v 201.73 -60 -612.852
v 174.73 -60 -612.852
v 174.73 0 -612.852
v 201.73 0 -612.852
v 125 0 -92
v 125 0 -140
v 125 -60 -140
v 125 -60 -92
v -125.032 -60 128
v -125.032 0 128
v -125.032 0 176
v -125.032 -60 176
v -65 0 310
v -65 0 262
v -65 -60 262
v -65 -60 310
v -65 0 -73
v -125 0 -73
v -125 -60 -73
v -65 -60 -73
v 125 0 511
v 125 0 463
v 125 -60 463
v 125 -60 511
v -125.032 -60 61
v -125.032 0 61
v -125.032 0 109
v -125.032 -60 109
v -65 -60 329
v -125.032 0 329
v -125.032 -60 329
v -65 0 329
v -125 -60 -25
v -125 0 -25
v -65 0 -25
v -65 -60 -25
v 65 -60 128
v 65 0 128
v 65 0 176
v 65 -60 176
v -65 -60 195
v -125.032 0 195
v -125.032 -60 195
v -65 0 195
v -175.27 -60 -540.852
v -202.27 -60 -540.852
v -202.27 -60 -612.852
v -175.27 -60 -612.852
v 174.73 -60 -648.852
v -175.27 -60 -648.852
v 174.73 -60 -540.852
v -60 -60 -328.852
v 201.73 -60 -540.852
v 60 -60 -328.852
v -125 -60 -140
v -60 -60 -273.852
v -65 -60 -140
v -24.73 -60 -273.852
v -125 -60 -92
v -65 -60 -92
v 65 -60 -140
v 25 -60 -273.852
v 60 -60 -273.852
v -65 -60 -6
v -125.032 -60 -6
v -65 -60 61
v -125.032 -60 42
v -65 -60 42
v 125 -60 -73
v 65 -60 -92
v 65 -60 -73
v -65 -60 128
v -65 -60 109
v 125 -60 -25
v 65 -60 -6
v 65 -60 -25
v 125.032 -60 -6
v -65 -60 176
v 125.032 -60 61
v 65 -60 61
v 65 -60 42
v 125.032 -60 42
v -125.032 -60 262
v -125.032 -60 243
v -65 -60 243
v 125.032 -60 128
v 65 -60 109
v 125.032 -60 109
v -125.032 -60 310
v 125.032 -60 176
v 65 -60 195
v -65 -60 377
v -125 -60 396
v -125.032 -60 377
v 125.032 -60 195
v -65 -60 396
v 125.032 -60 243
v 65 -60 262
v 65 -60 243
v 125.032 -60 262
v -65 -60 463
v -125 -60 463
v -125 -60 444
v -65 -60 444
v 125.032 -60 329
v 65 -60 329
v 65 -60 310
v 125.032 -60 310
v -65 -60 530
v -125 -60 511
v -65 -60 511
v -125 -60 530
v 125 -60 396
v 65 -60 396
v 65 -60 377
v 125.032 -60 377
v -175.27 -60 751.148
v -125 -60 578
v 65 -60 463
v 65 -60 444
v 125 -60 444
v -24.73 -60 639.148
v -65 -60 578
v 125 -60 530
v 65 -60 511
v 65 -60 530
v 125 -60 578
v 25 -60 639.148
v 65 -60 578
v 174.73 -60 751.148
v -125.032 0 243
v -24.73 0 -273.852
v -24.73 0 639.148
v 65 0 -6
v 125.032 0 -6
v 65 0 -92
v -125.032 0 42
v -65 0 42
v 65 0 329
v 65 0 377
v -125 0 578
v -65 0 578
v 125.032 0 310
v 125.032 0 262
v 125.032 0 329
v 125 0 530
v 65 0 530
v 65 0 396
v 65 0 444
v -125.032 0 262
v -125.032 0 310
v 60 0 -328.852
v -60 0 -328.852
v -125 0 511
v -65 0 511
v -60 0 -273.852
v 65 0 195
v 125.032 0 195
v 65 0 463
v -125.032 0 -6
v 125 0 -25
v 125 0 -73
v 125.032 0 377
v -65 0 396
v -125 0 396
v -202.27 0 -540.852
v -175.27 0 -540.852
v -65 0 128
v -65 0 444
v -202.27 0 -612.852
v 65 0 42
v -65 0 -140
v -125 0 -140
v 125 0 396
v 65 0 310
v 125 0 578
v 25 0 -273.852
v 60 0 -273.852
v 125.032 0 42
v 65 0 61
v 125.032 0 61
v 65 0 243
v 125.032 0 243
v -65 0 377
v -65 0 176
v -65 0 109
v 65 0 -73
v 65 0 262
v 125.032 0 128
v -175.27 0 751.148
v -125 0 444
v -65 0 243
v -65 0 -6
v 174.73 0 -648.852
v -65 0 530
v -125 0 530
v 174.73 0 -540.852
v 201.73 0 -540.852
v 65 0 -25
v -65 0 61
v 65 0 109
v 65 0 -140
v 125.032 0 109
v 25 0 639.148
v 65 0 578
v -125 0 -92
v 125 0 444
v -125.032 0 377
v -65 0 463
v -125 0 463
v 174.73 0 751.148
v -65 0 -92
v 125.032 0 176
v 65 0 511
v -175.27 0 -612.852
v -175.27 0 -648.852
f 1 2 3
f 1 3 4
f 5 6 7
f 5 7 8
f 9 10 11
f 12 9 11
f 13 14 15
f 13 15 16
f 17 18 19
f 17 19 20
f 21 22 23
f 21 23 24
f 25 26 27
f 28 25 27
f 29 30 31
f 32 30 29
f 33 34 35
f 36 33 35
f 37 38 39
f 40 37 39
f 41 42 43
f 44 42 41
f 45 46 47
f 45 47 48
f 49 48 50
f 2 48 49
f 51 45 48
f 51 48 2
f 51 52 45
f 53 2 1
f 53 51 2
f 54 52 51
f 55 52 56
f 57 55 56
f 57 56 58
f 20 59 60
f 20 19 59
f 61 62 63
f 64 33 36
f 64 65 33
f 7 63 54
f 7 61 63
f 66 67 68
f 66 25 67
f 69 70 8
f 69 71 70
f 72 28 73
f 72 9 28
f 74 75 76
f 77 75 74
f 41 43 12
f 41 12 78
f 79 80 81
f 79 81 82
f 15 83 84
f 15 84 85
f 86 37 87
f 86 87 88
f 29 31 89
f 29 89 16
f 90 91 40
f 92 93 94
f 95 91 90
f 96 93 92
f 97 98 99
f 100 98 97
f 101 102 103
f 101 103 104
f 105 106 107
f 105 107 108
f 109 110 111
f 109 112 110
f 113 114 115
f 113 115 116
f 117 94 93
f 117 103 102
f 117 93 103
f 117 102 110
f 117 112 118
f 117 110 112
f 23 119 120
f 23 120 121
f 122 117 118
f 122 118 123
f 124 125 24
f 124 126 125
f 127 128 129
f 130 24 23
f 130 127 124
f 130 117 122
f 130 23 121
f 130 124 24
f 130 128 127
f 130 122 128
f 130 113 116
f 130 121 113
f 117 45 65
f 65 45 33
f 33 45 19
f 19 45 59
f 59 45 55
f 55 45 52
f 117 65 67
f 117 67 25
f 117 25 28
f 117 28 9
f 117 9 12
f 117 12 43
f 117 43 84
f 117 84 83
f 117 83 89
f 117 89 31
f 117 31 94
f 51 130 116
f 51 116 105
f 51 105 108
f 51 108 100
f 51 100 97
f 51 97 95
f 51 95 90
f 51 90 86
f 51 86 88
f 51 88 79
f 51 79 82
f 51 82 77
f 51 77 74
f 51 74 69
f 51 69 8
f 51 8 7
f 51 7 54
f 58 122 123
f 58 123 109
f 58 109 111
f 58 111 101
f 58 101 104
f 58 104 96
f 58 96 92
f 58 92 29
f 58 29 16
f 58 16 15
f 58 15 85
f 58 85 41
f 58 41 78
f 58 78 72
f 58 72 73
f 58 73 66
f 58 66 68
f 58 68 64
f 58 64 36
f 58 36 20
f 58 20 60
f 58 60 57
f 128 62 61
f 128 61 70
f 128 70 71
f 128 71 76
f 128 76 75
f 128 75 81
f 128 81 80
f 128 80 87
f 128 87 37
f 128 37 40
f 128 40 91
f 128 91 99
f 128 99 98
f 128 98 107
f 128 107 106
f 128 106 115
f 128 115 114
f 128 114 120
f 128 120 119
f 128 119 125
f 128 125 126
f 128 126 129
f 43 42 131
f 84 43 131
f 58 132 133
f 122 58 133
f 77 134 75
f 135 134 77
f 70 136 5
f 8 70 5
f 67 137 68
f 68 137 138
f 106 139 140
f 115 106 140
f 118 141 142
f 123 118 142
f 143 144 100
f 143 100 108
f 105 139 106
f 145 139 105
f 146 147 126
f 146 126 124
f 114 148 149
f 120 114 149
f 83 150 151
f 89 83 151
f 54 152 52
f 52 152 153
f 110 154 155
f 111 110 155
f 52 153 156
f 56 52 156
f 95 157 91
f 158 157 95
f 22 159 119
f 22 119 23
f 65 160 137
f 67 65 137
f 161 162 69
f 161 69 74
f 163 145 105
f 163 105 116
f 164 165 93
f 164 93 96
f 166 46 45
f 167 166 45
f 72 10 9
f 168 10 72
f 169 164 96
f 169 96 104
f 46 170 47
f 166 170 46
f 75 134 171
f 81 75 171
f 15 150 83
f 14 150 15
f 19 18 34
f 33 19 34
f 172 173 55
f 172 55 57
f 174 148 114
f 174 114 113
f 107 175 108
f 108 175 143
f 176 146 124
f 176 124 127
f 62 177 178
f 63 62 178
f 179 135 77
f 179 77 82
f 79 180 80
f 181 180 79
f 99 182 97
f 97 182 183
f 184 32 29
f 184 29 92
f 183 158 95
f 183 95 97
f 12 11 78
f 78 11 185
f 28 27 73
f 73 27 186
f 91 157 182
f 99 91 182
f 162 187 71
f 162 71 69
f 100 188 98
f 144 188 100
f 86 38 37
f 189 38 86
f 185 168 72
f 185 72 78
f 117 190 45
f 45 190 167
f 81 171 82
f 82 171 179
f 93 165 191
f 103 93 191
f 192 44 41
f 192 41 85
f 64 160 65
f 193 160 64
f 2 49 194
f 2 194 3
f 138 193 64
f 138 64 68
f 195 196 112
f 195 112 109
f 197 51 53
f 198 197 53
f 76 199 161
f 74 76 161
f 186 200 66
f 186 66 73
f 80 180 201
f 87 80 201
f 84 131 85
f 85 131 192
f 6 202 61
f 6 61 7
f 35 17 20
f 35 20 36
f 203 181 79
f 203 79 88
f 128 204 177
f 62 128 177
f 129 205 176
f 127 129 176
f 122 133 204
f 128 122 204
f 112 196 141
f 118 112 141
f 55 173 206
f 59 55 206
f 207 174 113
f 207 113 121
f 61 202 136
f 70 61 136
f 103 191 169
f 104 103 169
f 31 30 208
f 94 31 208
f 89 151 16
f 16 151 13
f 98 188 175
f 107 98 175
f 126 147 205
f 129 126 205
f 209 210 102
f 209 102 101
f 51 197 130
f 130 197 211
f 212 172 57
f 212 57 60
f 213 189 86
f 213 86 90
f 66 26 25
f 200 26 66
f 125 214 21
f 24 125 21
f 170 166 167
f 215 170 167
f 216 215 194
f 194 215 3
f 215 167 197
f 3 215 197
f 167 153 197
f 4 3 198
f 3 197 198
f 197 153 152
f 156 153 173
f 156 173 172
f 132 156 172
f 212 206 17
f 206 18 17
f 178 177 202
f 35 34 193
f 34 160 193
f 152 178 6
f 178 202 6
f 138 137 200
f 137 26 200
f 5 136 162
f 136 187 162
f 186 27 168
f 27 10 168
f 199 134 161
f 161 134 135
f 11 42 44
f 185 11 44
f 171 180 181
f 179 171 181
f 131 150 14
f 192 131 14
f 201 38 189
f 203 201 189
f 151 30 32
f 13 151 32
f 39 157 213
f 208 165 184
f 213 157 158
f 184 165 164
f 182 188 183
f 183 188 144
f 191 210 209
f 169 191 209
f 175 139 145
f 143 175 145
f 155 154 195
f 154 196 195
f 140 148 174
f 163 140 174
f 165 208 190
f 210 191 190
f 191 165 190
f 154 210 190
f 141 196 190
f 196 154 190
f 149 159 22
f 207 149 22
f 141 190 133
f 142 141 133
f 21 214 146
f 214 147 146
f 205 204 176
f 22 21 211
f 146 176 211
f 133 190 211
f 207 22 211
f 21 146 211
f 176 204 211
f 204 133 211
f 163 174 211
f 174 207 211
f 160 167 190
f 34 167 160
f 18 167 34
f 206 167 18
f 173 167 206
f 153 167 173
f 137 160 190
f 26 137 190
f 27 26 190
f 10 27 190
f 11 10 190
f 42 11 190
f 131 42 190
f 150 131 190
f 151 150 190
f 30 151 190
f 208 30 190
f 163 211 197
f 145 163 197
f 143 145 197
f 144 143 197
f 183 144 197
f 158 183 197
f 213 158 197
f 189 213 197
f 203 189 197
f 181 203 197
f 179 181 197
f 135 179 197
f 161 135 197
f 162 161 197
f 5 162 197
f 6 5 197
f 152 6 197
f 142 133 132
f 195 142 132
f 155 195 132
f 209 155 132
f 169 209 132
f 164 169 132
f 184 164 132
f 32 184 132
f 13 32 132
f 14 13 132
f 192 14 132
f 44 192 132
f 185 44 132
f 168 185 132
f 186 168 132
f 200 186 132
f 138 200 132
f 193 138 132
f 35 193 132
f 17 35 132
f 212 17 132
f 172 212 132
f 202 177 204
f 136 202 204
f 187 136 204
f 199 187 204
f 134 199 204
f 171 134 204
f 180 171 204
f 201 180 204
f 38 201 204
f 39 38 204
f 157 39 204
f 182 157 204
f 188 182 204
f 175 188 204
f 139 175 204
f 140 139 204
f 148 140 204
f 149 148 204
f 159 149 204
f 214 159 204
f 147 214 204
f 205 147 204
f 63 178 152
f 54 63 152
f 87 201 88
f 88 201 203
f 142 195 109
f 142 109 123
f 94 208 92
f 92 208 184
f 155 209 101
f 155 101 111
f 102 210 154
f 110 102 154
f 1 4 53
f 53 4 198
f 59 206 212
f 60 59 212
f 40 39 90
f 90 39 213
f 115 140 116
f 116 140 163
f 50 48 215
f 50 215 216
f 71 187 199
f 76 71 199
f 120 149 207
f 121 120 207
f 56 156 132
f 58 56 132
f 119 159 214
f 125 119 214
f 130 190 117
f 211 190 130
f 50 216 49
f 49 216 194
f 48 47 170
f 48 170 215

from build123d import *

# Parameters (mm, degrees)
F0_W     = 350
F0_H     = 1250
F0_W_2   = 60
F0_H_2   = 48
F0_W_3   = 60.0317394733
F0_W_4   = 27
F0_H_3   = 72
F1_DEPTH = 60


with BuildPart() as f1:
    # F0 (on Front) → F1 (new body)
    with BuildSketch(Plane.XZ):
        with Locations((-0.2704625484, 126.1477753774)):
            Rectangle(F0_W, F0_H)
        with Locations((-95, -116)):
            Rectangle(F0_W_2, F0_H_2, mode=Mode.SUBTRACT)
        with Locations((-95, -49)):
            Rectangle(F0_W_2, F0_H_2, mode=Mode.SUBTRACT)
        with Locations((-95.0158697367, 18)):
            Rectangle(F0_W_3, F0_H_2, mode=Mode.SUBTRACT)
        with Locations((95, -116)):
            Rectangle(F0_W_2, F0_H_2, mode=Mode.SUBTRACT)
        with Locations((95, -49)):
            Rectangle(F0_W_2, F0_H_2, mode=Mode.SUBTRACT)
        with Locations((95.0158697367, 18)):
            Rectangle(F0_W_3, F0_H_2, mode=Mode.SUBTRACT)
        with Locations((-95.0158697367, 85)):
            Rectangle(F0_W_3, F0_H_2, mode=Mode.SUBTRACT)
        with Locations((-95.0158697367, 152)):
            Rectangle(F0_W_3, F0_H_2, mode=Mode.SUBTRACT)
        with Locations((-95.0158697367, 219)):
            Rectangle(F0_W_3, F0_H_2, mode=Mode.SUBTRACT)
        with Locations((-95.0158697367, 286)):
            Rectangle(F0_W_3, F0_H_2, mode=Mode.SUBTRACT)
        with Locations((-95.0158697367, 353)):
            Rectangle(F0_W_3, F0_H_2, mode=Mode.SUBTRACT)
        with Locations((-95, 420)):
            Rectangle(F0_W_2, F0_H_2, mode=Mode.SUBTRACT)
        with Locations((-95, 487)):
            Rectangle(F0_W_2, F0_H_2, mode=Mode.SUBTRACT)
        with Locations((-95, 554)):
            Rectangle(F0_W_2, F0_H_2, mode=Mode.SUBTRACT)
        Polygon((-0.2704625484, 669.4326684133), (12.5, 669.4326684133), (24.7295374516, 669.4326684133), (24.7295374516, 658.1978485242), (12.5, 658.1978485242), (-0.2704625484, 658.1978485242), (-25.2704625484, 658.1978485242), (-25.2704625484, 669.4326684133), align=None, mode=Mode.SUBTRACT)
        Polygon((-24.7295374516, -193.3112977796), (-24.7295374516, 639.1477753774), (25, 639.1477753774), (25, -210.8522246226), (25, -273.8522246226), (60, -273.8522246226), (60, -328.8522246226), (25, -328.8522246226), (0, -328.8522246226), (-25, -328.8522246226), (-60, -328.8522246226), (-60, -273.8522246226), (-24.7295374516, -273.8522246226), align=None, mode=Mode.SUBTRACT)
        with Locations((95.0158697367, 85)):
            Rectangle(F0_W_3, F0_H_2, mode=Mode.SUBTRACT)
        with Locations((95.0158697367, 152)):
            Rectangle(F0_W_3, F0_H_2, mode=Mode.SUBTRACT)
        with Locations((95.0158697367, 219)):
            Rectangle(F0_W_3, F0_H_2, mode=Mode.SUBTRACT)
        with Locations((95.0158697367, 286)):
            Rectangle(F0_W_3, F0_H_2, mode=Mode.SUBTRACT)
        with Locations((95.0158697367, 353)):
            Rectangle(F0_W_3, F0_H_2, mode=Mode.SUBTRACT)
        with Locations((95, 420)):
            Rectangle(F0_W_2, F0_H_2, mode=Mode.SUBTRACT)
        with Locations((95, 487)):
            Rectangle(F0_W_2, F0_H_2, mode=Mode.SUBTRACT)
        with Locations((95, 554)):
            Rectangle(F0_W_2, F0_H_2, mode=Mode.SUBTRACT)
        Polygon((174.7295374516, -540.8522246226), (174.7295374516, -498.8522246226), (-175.2704625484, -498.8522246226), (-175.2704625484, -540.8522246226), (-175.2704625484, -612.8522246226), (-175.2704625484, -648.8522246226), (174.7295374516, -648.8522246226), (174.7295374516, -612.8522246226), align=None)
        with Locations((188.2295374516, -576.8522246226)):
            Rectangle(F0_W_4, F0_H_3)
        with Locations((-188.7704625484, -576.8522246226)):
            Rectangle(F0_W_4, F0_H_3)
        Polygon((24.7295374516, 669.4326684133), (12.5, 669.4326684133), (-0.2704625484, 669.4326684133), (-25.2704625484, 669.4326684133), (-25.2704625484, 658.1978485242), (-0.2704625484, 658.1978485242), (12.5, 658.1978485242), (24.7295374516, 658.1978485242), align=None)
    extrude(amount=F1_DEPTH)


solid = f1.part
